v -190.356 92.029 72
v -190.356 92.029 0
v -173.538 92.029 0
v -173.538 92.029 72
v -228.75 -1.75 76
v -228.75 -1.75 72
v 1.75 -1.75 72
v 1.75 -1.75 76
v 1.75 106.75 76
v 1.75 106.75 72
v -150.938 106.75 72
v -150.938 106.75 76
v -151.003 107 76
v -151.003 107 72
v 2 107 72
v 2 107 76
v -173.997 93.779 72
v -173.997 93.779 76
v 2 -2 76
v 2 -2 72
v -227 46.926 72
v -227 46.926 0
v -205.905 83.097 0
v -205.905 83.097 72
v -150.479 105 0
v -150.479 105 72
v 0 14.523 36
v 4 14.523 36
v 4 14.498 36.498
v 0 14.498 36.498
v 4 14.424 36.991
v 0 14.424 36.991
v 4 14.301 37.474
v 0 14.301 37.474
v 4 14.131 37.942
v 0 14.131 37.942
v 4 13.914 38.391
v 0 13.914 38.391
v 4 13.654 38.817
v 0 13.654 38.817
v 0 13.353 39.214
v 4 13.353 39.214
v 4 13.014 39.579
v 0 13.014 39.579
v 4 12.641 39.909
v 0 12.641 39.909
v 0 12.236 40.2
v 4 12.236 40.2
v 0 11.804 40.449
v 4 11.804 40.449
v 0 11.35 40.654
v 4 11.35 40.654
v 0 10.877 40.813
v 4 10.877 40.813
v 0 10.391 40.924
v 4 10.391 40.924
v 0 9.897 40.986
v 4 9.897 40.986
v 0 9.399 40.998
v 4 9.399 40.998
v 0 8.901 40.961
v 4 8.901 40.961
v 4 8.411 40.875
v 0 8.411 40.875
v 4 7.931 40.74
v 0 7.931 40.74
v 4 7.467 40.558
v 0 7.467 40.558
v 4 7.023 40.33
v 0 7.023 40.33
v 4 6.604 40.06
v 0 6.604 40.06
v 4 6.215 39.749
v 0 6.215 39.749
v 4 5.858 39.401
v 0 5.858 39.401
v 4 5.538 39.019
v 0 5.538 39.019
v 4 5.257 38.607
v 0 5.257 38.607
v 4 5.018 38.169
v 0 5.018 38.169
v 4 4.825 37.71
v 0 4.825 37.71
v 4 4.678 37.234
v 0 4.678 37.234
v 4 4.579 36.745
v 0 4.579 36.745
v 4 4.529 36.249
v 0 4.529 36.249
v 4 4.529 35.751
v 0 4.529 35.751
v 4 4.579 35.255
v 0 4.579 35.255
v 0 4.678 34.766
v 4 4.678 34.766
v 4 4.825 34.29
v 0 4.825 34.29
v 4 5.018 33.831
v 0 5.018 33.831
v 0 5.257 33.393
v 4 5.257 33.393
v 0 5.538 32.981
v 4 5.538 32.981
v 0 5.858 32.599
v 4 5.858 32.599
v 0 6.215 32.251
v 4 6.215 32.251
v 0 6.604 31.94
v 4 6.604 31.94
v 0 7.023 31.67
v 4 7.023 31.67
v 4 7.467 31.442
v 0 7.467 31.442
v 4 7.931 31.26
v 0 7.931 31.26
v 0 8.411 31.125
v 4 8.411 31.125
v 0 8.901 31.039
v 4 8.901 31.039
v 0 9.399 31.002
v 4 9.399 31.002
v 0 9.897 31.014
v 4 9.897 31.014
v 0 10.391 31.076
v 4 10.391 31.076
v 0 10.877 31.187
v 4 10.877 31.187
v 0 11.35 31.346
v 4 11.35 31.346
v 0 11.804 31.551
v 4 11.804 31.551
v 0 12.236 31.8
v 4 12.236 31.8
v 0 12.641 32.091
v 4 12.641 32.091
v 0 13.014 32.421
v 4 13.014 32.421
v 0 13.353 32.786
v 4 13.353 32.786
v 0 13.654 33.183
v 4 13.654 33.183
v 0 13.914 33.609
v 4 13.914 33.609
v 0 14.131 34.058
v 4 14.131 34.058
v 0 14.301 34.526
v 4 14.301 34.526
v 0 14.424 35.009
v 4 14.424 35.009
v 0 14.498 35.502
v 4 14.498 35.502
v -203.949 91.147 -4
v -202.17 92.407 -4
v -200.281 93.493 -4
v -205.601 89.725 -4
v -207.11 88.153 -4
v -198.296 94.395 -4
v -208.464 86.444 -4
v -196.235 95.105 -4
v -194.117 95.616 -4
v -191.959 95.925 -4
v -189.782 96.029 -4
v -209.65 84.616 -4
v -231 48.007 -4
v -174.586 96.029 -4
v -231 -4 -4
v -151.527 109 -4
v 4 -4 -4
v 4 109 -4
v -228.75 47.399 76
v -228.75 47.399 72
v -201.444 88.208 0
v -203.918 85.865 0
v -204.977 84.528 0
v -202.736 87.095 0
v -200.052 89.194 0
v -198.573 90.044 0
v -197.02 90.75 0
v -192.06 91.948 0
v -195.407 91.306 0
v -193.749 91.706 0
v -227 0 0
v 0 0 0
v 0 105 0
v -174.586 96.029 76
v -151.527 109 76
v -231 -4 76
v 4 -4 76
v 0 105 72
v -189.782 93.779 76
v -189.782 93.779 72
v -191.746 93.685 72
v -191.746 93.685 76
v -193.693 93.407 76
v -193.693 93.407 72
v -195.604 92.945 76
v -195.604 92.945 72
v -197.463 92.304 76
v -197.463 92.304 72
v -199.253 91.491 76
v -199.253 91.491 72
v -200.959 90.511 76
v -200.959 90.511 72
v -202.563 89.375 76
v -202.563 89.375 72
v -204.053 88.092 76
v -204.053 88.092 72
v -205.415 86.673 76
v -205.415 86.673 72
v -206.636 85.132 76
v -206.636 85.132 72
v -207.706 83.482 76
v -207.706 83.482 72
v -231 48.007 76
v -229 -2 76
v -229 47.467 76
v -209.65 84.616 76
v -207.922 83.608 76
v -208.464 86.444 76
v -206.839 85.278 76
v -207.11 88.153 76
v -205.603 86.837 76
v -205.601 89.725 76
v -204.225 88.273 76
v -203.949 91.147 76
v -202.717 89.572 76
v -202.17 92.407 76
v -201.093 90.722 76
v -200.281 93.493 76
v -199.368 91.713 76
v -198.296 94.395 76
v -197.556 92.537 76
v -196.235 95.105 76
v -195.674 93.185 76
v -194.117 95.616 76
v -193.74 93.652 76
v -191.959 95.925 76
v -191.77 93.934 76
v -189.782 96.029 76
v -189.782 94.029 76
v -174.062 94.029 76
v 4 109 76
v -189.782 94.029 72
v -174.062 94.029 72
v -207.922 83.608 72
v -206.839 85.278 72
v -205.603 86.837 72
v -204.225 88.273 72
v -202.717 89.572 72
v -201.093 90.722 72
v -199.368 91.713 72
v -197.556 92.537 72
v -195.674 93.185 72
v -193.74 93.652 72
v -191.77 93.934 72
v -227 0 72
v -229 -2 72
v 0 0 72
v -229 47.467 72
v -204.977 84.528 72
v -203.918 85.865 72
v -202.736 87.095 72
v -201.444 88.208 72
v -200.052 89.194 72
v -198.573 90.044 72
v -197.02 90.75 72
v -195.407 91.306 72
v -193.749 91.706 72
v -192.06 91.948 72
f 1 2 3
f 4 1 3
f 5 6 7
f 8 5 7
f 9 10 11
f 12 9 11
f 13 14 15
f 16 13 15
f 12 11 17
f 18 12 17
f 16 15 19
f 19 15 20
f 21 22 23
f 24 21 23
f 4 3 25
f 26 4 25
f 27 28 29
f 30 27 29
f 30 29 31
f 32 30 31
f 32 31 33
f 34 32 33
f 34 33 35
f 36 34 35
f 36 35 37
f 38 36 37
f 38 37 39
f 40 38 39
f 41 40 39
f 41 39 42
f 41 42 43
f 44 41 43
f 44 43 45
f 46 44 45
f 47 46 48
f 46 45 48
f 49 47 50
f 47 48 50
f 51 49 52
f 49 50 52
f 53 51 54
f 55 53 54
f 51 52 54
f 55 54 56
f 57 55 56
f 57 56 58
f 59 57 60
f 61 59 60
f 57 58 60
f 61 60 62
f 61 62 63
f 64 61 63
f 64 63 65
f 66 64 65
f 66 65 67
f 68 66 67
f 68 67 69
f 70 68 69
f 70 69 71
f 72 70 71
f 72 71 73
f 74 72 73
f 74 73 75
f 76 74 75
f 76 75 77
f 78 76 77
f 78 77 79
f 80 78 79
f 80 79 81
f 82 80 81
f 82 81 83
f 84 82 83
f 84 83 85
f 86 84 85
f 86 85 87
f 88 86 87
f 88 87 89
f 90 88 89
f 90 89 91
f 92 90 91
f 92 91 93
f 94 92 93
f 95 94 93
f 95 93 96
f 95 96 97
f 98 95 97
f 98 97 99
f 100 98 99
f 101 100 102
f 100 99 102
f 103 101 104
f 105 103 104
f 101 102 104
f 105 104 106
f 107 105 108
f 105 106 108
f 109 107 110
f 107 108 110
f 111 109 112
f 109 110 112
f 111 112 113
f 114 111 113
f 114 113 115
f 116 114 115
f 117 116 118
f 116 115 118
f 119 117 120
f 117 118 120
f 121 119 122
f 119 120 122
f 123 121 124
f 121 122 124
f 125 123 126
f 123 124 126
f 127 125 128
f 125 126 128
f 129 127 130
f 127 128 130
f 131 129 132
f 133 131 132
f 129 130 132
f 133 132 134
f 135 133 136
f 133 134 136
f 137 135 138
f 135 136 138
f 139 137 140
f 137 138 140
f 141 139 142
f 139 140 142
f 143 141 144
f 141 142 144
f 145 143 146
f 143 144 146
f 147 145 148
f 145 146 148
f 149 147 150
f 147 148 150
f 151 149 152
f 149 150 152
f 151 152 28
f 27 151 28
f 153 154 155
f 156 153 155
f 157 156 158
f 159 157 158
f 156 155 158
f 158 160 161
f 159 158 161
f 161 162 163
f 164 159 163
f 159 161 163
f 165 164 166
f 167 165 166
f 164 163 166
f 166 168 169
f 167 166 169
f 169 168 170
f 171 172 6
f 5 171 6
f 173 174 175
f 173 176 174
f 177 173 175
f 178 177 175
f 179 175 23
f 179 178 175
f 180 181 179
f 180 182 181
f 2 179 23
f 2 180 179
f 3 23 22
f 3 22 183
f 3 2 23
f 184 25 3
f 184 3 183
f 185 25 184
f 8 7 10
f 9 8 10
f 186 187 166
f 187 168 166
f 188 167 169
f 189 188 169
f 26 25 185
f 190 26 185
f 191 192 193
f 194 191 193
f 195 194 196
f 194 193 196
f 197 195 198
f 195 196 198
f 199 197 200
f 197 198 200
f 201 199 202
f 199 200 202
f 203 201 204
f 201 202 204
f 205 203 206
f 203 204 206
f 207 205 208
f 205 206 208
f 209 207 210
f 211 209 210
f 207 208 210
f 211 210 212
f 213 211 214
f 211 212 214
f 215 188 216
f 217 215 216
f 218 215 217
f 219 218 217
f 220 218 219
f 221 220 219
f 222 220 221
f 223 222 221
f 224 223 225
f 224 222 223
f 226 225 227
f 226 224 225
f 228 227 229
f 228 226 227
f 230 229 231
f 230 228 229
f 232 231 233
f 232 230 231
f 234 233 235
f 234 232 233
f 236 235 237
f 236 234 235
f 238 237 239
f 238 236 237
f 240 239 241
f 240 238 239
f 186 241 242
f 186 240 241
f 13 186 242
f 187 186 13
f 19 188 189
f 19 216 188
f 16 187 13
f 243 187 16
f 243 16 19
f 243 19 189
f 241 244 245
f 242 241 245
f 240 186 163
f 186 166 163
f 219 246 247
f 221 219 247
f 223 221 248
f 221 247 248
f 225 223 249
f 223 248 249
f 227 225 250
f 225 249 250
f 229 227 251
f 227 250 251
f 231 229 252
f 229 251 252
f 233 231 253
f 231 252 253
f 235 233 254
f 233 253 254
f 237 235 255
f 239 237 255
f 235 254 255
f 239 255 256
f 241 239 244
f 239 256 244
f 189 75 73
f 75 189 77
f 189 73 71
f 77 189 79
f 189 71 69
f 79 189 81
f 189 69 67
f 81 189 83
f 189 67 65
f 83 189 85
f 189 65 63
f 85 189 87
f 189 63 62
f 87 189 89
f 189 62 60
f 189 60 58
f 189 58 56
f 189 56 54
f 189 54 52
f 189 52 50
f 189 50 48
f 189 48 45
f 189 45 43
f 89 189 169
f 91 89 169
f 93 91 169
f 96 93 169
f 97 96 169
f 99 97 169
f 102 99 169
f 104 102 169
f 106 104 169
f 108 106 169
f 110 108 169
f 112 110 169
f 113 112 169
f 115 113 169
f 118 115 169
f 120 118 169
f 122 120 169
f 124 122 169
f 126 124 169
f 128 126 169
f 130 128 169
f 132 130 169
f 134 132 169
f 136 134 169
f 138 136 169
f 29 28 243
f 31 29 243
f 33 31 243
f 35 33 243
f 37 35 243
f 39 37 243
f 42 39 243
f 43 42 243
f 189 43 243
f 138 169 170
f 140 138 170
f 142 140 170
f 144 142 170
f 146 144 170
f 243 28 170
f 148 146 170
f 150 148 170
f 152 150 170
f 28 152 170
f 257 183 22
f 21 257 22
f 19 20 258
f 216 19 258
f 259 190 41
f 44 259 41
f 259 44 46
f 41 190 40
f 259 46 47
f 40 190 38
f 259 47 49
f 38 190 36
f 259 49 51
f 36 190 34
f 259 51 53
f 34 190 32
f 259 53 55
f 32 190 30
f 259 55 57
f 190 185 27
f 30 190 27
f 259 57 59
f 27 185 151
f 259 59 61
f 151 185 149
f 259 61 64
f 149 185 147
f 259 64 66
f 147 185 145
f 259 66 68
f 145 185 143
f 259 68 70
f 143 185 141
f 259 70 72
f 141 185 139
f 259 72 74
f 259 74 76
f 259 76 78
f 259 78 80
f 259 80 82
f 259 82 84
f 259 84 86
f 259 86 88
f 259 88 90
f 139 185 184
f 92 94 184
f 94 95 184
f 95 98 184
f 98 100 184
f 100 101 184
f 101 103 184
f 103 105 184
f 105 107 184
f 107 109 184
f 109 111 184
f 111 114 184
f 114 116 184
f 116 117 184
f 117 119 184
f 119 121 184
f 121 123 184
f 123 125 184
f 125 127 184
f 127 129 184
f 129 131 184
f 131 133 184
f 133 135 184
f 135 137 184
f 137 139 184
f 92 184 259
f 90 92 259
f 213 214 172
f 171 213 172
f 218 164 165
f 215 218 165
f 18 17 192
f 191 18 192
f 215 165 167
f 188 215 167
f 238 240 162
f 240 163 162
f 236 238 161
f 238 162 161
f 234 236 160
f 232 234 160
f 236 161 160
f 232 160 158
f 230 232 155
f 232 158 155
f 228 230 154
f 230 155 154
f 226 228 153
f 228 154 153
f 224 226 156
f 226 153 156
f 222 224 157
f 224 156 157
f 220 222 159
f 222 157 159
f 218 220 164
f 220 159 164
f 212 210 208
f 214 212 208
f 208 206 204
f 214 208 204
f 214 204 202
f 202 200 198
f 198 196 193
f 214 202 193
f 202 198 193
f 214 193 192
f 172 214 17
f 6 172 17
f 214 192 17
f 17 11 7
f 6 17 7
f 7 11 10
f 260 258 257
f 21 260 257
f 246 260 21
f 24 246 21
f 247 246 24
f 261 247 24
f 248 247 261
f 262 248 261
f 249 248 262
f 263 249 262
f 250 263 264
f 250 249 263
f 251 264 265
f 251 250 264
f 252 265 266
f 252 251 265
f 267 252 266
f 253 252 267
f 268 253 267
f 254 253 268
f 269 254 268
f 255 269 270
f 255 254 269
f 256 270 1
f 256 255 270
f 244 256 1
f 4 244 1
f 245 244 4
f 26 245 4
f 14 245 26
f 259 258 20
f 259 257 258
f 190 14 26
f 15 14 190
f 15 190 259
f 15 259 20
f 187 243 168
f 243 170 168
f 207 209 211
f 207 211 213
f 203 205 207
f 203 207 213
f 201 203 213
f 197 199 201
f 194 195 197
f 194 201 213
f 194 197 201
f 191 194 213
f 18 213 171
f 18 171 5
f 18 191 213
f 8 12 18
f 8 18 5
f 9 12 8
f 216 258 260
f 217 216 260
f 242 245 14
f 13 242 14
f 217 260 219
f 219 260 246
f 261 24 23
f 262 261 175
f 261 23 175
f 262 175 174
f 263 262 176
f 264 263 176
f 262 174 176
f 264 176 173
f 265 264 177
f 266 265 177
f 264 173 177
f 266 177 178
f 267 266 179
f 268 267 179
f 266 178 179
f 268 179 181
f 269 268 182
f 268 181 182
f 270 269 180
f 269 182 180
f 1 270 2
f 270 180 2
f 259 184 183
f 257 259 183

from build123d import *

# Parameters (mm, degrees)
F1_DEPTH = 72
F3_DEPTH = 4
F5_DEPTH = 4
F6_R     = 5
F7_DEPTH = 25
F9_DEPTH = 4


with BuildPart() as f1:
    # F0 (on Top) → F1 (new body)
    with BuildSketch(Plane.XY):
        with BuildLine():
            Line((-231, -4), (-170.1878618188, -4))
            Line((-170.1878618188, -4), (4, -4))
            Line((4, -4), (4, 109))
            Line((4, 109), (-151.5271144073, 109))
            Line((-151.5271144073, 109), (-174.586146194, 96.02858603))
            Line((-174.586146194, 96.02858603), (-189.7819859549, 96.02858603))
            ThreePointArc((-189.7819859549, 96.02858603), (-201.238369879, 92.9722884793), (-209.6500478789, 84.6156527591))
            Line((-209.6500478789, 84.6156527591), (-231, 48.0074083488))
            Line((-231, 48.0074083488), (-231, -4))
        make_face()
        with BuildLine():
            Line((0, 105), (0, 0))
            Line((0, 0), (-170.1878618188, 0))
            Line((-170.1878618188, 0), (-227, 0))
            Line((-227, 0), (-227, 46.9262242496))
            Line((-227, 46.9262242496), (-205.905340146, 83.0967252093))
            ThreePointArc((-205.905340146, 83.0967252093), (-199.3222877982, 89.6367009903), (-190.3564221185, 92.02858603))
            Line((-190.3564221185, 92.02858603), (-173.5382919705, 92.02858603))
            Line((-173.5382919705, 92.02858603), (-150.4792601838, 105))
            Line((-150.4792601838, 105), (0, 105))
        make_face(mode=Mode.SUBTRACT)
    extrude(amount=F1_DEPTH)

    # F2 (on Top) → F3 (join)
    with BuildSketch(Plane.XY):
        with BuildLine():
            Line((4, -4), (4, 109))
            Line((4, 109), (-151.5271144073, 109))
            Line((-151.5271144073, 109), (-174.586146194, 96.02858603))
            Line((-174.586146194, 96.02858603), (-189.7819859549, 96.02858603))
            ThreePointArc((-189.7819859549, 96.02858603), (-201.238369879, 92.9722884793), (-209.6500478789, 84.6156527591))
            Line((-209.6500478789, 84.6156527591), (-231, 48.0074083488))
            Line((-231, 48.0074083488), (-231, -4))
            Line((-231, -4), (4, -4))
        make_face()
    extrude(amount=-F3_DEPTH)

    # F4 (on face) → F5 (join)
    with BuildSketch(Plane.XY.offset(72)):
        with BuildLine():
            Line((4, -4), (4, 109))
            Line((4, 109), (-151.5271144073, 109))
            Line((-151.5271144073, 109), (-174.586146194, 96.02858603))
            Line((-174.586146194, 96.02858603), (-189.7819859549, 96.02858603))
            ThreePointArc((-189.7819859549, 96.02858603), (-201.238369879, 92.9722884793), (-209.6500478789, 84.6156527591))
            Line((-209.6500478789, 84.6156527591), (-231, 48.0074083488))
            Line((-231, 48.0074083488), (-231, -4))
            Line((-231, -4), (4, -4))
        make_face()
        with BuildLine():
            Line((2, 107), (2, -2))
            Line((2, -2), (-229, -2))
            Line((-229, -2), (-229, 47.4668162992))
            Line((-229, 47.4668162992), (-207.9223903203, 83.6080817392))
            ThreePointArc((-207.9223903203, 83.6080817392), (-200.2421625812, 91.2380534837), (-189.7819859549, 94.02858603))
            Line((-189.7819859549, 94.02858603), (-174.0622190822, 94.02858603))
            Line((-174.0622190822, 94.02858603), (-151.0031872955, 107))
            Line((-151.0031872955, 107), (2, 107))
        make_face(mode=Mode.SUBTRACT)
    extrude(amount=F5_DEPTH)

    # F6 (on face) → F7 (cut)
    with BuildSketch(Plane.YZ.offset(4)):
        with Locations((9.5232147723, 36)):
            Circle(F6_R)
    extrude(amount=-F7_DEPTH, mode=Mode.SUBTRACT)


with BuildPart() as f9:
    # F8 (on face) → F9 (new body)
    with BuildSketch(Plane.XY.offset(72)):
        with BuildLine():
            Line((-173.9967281933, 93.77858603), (-189.7819859549, 93.77858603))
            ThreePointArc((-189.7819859549, 93.77858603), (-200.117636669, 91.0212741092), (-207.7064331255, 83.4821353617))
            Line((-207.7064331255, 83.4821353617), (-228.75, 47.399242293))
            Line((-228.75, 47.399242293), (-228.75, -1.75))
            Line((-228.75, -1.75), (1.75, -1.75))
            Line((1.75, -1.75), (1.75, 106.75))
            Line((1.75, 106.75), (-150.9376964066, 106.75))
            Line((-150.9376964066, 106.75), (-173.9967281933, 93.77858603))
        make_face()
        with BuildLine():
            Line((-227, 46.9262242496), (-205.905340146, 83.0967252093))
            ThreePointArc((-205.905340146, 83.0967252093), (-199.3222877982, 89.6367009903), (-190.3564221185, 92.02858603))
            Line((-190.3564221185, 92.02858603), (-173.5382919705, 92.02858603))
            Line((-173.5382919705, 92.02858603), (-150.4792601838, 105))
            Line((-150.4792601838, 105), (0, 105))
            Line((0, 105), (0, 0))
            Line((0, 0), (-227, 0))
            Line((-227, 0), (-227, 46.9262242496))
        make_face(mode=Mode.SUBTRACT)
        with BuildLine():
            ThreePointArc((-190.3564221185, 92.02858603), (-199.3222877982, 89.6367009903), (-205.905340146, 83.0967252093))
            Line((-205.905340146, 83.0967252093), (-227, 46.9262242496))
            Line((-227, 46.9262242496), (-227, 0))
            Line((-227, 0), (0, 0))
            Line((0, 0), (0, 105))
            Line((0, 105), (-150.4792601838, 105))
            Line((-150.4792601838, 105), (-173.5382919705, 92.02858603))
            Line((-173.5382919705, 92.02858603), (-190.3564221185, 92.02858603))
        make_face()
    extrude(amount=F9_DEPTH)


solid = Compound([f1.part, f9.part])
